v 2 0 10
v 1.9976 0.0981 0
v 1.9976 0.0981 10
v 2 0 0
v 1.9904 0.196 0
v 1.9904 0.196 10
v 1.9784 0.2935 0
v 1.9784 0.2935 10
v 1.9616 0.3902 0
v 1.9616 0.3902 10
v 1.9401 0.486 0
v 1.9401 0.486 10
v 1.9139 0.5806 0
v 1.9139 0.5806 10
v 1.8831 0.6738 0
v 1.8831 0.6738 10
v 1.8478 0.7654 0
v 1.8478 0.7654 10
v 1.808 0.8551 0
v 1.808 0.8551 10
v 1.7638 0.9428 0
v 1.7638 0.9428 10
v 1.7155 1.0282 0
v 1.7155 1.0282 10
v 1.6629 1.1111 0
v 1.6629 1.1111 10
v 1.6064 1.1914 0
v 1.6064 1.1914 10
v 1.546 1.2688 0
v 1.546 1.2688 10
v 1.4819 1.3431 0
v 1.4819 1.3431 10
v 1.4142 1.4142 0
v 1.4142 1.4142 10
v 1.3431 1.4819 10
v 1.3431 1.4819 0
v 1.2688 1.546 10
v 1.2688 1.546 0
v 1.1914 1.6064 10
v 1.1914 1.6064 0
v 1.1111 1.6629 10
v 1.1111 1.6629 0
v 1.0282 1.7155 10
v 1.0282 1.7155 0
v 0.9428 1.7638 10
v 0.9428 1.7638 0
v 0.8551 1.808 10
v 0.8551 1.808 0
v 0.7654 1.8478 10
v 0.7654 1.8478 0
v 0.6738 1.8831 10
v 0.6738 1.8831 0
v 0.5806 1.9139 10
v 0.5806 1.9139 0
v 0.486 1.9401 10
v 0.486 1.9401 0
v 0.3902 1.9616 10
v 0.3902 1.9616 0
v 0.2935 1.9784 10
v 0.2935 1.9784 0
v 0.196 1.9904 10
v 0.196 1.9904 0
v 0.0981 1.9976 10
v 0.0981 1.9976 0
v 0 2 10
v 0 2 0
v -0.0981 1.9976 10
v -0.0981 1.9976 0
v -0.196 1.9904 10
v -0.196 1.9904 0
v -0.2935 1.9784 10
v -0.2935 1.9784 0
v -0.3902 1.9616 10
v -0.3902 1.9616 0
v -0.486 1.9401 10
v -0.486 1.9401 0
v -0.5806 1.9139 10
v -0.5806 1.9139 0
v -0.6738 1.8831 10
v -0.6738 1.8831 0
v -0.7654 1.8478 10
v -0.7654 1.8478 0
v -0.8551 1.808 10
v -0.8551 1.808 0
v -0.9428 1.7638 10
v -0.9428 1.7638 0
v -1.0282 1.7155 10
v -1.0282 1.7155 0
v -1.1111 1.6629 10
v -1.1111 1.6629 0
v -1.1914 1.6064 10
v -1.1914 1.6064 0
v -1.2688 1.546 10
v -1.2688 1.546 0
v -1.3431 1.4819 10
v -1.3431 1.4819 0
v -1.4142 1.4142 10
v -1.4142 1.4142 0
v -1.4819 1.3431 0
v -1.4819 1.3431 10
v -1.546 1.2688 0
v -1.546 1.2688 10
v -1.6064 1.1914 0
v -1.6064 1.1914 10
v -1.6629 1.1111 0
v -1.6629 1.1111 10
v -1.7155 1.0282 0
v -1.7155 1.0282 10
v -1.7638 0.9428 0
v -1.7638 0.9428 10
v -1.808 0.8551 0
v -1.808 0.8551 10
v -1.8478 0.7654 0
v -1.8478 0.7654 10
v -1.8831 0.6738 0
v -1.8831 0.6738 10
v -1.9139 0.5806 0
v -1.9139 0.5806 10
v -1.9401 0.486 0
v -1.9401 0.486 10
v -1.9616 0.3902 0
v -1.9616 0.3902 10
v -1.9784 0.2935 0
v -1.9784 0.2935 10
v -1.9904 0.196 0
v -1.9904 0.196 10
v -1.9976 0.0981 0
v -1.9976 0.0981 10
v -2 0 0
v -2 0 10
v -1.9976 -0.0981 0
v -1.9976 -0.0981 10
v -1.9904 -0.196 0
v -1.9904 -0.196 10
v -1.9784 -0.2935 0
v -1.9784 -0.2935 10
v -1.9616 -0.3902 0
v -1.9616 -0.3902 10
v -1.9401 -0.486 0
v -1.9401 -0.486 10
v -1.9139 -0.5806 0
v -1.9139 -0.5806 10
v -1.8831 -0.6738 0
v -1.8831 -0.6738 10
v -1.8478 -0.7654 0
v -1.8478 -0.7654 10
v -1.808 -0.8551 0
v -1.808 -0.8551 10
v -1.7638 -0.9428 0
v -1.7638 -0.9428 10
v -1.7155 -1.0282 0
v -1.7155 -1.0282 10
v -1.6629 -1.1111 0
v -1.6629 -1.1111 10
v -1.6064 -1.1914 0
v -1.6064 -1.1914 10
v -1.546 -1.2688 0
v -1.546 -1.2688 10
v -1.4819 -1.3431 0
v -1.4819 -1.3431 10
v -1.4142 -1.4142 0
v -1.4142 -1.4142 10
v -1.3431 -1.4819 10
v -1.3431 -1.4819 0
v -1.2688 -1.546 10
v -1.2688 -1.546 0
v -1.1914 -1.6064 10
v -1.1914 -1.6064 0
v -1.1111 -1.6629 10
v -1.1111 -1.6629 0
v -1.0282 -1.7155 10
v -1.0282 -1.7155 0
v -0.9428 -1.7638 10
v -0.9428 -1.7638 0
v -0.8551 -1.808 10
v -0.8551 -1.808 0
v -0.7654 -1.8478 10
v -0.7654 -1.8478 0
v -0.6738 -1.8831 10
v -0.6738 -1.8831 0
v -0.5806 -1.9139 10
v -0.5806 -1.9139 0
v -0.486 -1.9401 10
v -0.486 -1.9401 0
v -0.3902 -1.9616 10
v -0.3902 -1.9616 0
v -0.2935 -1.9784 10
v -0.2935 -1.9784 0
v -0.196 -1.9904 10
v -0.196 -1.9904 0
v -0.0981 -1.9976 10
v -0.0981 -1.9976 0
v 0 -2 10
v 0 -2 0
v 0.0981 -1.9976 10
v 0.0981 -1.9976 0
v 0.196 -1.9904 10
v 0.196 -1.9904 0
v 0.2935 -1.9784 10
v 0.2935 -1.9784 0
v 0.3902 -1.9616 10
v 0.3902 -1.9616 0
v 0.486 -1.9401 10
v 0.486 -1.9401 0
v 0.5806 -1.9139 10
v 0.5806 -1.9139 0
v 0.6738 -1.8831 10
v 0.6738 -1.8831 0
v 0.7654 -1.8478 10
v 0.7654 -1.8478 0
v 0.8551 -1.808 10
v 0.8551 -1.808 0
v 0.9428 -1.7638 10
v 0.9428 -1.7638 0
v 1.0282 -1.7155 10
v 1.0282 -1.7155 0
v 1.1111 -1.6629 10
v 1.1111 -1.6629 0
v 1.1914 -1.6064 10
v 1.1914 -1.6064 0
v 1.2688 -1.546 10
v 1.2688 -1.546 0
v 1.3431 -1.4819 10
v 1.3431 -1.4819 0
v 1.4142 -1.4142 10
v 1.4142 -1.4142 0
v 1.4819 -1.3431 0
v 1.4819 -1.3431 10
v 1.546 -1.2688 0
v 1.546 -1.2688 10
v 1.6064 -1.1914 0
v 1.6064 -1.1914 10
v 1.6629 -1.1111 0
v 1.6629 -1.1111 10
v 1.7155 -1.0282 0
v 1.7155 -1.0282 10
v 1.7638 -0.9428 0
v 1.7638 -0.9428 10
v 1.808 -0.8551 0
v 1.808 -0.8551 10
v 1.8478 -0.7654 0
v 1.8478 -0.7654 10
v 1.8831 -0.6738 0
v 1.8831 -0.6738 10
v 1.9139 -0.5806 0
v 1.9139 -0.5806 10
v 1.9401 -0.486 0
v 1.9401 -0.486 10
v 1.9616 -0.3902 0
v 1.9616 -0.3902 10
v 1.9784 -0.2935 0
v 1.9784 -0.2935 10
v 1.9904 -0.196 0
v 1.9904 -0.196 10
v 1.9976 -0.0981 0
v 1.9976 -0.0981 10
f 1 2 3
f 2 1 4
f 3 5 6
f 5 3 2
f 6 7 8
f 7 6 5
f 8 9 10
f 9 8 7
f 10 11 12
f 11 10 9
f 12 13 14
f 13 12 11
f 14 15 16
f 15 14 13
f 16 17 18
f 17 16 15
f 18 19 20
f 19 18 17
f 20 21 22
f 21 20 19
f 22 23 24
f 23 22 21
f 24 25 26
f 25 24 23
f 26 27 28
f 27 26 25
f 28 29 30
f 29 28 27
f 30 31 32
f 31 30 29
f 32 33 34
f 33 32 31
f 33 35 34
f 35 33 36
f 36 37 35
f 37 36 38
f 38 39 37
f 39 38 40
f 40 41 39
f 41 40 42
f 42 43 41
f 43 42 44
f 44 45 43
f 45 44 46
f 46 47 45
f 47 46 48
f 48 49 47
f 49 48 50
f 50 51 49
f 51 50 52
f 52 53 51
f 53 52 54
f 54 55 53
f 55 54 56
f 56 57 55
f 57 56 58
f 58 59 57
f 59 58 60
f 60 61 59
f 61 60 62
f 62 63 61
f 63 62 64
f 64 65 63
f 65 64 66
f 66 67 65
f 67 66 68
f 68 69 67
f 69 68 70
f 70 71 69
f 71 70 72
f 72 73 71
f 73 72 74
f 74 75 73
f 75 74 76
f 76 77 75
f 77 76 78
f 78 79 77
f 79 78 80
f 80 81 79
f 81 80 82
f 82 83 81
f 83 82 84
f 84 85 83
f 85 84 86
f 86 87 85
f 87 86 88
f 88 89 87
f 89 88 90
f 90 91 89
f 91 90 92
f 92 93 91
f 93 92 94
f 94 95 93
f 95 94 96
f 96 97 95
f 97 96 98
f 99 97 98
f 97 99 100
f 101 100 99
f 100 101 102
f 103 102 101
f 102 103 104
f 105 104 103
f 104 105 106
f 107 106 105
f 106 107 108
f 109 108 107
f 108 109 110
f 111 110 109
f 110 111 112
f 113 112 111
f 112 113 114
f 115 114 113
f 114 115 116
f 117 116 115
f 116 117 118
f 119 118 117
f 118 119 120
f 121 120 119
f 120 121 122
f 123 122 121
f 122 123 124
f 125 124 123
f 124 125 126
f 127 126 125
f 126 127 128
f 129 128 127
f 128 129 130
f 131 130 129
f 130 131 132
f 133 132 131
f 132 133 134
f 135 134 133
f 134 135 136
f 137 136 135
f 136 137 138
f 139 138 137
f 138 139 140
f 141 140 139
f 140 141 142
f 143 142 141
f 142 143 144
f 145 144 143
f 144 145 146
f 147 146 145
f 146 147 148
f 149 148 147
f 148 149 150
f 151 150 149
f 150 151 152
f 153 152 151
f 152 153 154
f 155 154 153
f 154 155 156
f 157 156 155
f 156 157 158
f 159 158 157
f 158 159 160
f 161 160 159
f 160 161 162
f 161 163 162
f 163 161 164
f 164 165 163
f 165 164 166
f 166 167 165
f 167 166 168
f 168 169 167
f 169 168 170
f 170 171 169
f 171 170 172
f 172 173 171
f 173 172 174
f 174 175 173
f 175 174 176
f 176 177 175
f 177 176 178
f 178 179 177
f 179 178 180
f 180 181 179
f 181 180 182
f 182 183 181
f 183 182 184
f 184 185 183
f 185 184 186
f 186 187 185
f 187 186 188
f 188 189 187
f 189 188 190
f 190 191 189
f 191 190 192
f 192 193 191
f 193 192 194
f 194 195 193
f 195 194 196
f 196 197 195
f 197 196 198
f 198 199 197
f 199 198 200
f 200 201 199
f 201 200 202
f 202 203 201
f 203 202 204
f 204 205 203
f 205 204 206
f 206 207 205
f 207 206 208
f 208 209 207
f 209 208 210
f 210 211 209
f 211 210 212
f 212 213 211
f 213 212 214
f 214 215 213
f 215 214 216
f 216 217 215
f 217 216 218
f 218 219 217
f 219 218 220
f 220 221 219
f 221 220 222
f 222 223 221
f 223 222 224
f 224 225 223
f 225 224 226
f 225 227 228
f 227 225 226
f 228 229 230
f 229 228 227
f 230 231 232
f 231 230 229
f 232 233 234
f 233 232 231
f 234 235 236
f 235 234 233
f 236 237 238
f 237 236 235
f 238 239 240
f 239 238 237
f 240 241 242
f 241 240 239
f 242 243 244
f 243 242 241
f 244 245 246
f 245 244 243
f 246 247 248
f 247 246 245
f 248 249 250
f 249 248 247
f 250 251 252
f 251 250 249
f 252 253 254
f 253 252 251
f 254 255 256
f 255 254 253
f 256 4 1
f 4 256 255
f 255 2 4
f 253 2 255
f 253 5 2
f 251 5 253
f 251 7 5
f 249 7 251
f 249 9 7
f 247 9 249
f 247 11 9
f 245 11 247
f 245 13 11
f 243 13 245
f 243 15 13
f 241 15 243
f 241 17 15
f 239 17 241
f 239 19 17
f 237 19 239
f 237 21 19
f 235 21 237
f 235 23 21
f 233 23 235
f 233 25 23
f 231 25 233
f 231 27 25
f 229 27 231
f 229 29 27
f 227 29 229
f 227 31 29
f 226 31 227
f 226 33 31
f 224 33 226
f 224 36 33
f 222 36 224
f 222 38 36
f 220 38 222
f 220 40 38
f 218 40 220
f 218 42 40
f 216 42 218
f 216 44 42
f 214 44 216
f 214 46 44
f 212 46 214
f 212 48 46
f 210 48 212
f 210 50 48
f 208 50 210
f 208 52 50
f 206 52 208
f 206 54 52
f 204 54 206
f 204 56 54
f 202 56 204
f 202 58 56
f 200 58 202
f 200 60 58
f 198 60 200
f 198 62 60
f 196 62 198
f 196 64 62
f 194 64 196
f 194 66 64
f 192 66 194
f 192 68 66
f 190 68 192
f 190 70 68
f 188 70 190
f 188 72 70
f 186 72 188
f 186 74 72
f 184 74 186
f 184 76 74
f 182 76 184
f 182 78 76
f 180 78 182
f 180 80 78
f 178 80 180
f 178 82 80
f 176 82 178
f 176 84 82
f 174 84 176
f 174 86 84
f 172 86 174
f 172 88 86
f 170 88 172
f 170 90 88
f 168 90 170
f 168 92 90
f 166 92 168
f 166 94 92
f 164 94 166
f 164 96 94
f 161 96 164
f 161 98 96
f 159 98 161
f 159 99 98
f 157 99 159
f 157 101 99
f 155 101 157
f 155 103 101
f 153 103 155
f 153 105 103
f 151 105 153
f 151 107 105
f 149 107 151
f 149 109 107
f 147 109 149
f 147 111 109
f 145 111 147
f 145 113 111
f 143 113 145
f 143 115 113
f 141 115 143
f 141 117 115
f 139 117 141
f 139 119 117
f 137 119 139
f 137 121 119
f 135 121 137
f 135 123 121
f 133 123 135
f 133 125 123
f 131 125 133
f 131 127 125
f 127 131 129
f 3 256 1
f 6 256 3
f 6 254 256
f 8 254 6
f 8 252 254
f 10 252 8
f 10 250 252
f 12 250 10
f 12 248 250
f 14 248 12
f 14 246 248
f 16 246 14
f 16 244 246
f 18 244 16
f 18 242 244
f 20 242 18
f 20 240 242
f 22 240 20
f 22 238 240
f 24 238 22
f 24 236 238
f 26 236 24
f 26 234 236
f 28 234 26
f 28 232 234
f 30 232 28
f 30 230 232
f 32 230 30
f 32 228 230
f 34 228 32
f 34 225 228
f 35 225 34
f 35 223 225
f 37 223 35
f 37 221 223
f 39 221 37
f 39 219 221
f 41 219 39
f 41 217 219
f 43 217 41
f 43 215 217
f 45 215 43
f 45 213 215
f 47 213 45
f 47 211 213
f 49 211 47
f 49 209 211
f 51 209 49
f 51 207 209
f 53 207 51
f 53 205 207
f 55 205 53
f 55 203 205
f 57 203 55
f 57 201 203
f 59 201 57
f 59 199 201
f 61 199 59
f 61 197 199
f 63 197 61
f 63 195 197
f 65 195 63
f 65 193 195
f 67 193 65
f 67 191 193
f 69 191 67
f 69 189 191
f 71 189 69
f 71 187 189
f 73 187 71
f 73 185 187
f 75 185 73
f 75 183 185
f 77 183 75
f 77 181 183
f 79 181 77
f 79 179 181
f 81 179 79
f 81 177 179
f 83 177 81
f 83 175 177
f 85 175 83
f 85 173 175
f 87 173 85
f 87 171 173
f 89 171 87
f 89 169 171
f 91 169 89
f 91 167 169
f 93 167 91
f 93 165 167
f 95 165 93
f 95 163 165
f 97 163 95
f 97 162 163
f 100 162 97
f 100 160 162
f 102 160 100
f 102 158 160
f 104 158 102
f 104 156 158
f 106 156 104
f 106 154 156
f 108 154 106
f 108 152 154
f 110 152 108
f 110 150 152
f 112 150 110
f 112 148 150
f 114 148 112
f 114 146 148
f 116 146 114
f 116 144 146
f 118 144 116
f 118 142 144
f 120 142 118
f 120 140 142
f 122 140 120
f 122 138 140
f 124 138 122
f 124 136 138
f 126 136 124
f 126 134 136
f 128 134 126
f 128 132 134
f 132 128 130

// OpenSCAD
// Unit of length: Unit.MM
cylinder(h = 10.0, d = 4.0, center = false, $fn = 128);
